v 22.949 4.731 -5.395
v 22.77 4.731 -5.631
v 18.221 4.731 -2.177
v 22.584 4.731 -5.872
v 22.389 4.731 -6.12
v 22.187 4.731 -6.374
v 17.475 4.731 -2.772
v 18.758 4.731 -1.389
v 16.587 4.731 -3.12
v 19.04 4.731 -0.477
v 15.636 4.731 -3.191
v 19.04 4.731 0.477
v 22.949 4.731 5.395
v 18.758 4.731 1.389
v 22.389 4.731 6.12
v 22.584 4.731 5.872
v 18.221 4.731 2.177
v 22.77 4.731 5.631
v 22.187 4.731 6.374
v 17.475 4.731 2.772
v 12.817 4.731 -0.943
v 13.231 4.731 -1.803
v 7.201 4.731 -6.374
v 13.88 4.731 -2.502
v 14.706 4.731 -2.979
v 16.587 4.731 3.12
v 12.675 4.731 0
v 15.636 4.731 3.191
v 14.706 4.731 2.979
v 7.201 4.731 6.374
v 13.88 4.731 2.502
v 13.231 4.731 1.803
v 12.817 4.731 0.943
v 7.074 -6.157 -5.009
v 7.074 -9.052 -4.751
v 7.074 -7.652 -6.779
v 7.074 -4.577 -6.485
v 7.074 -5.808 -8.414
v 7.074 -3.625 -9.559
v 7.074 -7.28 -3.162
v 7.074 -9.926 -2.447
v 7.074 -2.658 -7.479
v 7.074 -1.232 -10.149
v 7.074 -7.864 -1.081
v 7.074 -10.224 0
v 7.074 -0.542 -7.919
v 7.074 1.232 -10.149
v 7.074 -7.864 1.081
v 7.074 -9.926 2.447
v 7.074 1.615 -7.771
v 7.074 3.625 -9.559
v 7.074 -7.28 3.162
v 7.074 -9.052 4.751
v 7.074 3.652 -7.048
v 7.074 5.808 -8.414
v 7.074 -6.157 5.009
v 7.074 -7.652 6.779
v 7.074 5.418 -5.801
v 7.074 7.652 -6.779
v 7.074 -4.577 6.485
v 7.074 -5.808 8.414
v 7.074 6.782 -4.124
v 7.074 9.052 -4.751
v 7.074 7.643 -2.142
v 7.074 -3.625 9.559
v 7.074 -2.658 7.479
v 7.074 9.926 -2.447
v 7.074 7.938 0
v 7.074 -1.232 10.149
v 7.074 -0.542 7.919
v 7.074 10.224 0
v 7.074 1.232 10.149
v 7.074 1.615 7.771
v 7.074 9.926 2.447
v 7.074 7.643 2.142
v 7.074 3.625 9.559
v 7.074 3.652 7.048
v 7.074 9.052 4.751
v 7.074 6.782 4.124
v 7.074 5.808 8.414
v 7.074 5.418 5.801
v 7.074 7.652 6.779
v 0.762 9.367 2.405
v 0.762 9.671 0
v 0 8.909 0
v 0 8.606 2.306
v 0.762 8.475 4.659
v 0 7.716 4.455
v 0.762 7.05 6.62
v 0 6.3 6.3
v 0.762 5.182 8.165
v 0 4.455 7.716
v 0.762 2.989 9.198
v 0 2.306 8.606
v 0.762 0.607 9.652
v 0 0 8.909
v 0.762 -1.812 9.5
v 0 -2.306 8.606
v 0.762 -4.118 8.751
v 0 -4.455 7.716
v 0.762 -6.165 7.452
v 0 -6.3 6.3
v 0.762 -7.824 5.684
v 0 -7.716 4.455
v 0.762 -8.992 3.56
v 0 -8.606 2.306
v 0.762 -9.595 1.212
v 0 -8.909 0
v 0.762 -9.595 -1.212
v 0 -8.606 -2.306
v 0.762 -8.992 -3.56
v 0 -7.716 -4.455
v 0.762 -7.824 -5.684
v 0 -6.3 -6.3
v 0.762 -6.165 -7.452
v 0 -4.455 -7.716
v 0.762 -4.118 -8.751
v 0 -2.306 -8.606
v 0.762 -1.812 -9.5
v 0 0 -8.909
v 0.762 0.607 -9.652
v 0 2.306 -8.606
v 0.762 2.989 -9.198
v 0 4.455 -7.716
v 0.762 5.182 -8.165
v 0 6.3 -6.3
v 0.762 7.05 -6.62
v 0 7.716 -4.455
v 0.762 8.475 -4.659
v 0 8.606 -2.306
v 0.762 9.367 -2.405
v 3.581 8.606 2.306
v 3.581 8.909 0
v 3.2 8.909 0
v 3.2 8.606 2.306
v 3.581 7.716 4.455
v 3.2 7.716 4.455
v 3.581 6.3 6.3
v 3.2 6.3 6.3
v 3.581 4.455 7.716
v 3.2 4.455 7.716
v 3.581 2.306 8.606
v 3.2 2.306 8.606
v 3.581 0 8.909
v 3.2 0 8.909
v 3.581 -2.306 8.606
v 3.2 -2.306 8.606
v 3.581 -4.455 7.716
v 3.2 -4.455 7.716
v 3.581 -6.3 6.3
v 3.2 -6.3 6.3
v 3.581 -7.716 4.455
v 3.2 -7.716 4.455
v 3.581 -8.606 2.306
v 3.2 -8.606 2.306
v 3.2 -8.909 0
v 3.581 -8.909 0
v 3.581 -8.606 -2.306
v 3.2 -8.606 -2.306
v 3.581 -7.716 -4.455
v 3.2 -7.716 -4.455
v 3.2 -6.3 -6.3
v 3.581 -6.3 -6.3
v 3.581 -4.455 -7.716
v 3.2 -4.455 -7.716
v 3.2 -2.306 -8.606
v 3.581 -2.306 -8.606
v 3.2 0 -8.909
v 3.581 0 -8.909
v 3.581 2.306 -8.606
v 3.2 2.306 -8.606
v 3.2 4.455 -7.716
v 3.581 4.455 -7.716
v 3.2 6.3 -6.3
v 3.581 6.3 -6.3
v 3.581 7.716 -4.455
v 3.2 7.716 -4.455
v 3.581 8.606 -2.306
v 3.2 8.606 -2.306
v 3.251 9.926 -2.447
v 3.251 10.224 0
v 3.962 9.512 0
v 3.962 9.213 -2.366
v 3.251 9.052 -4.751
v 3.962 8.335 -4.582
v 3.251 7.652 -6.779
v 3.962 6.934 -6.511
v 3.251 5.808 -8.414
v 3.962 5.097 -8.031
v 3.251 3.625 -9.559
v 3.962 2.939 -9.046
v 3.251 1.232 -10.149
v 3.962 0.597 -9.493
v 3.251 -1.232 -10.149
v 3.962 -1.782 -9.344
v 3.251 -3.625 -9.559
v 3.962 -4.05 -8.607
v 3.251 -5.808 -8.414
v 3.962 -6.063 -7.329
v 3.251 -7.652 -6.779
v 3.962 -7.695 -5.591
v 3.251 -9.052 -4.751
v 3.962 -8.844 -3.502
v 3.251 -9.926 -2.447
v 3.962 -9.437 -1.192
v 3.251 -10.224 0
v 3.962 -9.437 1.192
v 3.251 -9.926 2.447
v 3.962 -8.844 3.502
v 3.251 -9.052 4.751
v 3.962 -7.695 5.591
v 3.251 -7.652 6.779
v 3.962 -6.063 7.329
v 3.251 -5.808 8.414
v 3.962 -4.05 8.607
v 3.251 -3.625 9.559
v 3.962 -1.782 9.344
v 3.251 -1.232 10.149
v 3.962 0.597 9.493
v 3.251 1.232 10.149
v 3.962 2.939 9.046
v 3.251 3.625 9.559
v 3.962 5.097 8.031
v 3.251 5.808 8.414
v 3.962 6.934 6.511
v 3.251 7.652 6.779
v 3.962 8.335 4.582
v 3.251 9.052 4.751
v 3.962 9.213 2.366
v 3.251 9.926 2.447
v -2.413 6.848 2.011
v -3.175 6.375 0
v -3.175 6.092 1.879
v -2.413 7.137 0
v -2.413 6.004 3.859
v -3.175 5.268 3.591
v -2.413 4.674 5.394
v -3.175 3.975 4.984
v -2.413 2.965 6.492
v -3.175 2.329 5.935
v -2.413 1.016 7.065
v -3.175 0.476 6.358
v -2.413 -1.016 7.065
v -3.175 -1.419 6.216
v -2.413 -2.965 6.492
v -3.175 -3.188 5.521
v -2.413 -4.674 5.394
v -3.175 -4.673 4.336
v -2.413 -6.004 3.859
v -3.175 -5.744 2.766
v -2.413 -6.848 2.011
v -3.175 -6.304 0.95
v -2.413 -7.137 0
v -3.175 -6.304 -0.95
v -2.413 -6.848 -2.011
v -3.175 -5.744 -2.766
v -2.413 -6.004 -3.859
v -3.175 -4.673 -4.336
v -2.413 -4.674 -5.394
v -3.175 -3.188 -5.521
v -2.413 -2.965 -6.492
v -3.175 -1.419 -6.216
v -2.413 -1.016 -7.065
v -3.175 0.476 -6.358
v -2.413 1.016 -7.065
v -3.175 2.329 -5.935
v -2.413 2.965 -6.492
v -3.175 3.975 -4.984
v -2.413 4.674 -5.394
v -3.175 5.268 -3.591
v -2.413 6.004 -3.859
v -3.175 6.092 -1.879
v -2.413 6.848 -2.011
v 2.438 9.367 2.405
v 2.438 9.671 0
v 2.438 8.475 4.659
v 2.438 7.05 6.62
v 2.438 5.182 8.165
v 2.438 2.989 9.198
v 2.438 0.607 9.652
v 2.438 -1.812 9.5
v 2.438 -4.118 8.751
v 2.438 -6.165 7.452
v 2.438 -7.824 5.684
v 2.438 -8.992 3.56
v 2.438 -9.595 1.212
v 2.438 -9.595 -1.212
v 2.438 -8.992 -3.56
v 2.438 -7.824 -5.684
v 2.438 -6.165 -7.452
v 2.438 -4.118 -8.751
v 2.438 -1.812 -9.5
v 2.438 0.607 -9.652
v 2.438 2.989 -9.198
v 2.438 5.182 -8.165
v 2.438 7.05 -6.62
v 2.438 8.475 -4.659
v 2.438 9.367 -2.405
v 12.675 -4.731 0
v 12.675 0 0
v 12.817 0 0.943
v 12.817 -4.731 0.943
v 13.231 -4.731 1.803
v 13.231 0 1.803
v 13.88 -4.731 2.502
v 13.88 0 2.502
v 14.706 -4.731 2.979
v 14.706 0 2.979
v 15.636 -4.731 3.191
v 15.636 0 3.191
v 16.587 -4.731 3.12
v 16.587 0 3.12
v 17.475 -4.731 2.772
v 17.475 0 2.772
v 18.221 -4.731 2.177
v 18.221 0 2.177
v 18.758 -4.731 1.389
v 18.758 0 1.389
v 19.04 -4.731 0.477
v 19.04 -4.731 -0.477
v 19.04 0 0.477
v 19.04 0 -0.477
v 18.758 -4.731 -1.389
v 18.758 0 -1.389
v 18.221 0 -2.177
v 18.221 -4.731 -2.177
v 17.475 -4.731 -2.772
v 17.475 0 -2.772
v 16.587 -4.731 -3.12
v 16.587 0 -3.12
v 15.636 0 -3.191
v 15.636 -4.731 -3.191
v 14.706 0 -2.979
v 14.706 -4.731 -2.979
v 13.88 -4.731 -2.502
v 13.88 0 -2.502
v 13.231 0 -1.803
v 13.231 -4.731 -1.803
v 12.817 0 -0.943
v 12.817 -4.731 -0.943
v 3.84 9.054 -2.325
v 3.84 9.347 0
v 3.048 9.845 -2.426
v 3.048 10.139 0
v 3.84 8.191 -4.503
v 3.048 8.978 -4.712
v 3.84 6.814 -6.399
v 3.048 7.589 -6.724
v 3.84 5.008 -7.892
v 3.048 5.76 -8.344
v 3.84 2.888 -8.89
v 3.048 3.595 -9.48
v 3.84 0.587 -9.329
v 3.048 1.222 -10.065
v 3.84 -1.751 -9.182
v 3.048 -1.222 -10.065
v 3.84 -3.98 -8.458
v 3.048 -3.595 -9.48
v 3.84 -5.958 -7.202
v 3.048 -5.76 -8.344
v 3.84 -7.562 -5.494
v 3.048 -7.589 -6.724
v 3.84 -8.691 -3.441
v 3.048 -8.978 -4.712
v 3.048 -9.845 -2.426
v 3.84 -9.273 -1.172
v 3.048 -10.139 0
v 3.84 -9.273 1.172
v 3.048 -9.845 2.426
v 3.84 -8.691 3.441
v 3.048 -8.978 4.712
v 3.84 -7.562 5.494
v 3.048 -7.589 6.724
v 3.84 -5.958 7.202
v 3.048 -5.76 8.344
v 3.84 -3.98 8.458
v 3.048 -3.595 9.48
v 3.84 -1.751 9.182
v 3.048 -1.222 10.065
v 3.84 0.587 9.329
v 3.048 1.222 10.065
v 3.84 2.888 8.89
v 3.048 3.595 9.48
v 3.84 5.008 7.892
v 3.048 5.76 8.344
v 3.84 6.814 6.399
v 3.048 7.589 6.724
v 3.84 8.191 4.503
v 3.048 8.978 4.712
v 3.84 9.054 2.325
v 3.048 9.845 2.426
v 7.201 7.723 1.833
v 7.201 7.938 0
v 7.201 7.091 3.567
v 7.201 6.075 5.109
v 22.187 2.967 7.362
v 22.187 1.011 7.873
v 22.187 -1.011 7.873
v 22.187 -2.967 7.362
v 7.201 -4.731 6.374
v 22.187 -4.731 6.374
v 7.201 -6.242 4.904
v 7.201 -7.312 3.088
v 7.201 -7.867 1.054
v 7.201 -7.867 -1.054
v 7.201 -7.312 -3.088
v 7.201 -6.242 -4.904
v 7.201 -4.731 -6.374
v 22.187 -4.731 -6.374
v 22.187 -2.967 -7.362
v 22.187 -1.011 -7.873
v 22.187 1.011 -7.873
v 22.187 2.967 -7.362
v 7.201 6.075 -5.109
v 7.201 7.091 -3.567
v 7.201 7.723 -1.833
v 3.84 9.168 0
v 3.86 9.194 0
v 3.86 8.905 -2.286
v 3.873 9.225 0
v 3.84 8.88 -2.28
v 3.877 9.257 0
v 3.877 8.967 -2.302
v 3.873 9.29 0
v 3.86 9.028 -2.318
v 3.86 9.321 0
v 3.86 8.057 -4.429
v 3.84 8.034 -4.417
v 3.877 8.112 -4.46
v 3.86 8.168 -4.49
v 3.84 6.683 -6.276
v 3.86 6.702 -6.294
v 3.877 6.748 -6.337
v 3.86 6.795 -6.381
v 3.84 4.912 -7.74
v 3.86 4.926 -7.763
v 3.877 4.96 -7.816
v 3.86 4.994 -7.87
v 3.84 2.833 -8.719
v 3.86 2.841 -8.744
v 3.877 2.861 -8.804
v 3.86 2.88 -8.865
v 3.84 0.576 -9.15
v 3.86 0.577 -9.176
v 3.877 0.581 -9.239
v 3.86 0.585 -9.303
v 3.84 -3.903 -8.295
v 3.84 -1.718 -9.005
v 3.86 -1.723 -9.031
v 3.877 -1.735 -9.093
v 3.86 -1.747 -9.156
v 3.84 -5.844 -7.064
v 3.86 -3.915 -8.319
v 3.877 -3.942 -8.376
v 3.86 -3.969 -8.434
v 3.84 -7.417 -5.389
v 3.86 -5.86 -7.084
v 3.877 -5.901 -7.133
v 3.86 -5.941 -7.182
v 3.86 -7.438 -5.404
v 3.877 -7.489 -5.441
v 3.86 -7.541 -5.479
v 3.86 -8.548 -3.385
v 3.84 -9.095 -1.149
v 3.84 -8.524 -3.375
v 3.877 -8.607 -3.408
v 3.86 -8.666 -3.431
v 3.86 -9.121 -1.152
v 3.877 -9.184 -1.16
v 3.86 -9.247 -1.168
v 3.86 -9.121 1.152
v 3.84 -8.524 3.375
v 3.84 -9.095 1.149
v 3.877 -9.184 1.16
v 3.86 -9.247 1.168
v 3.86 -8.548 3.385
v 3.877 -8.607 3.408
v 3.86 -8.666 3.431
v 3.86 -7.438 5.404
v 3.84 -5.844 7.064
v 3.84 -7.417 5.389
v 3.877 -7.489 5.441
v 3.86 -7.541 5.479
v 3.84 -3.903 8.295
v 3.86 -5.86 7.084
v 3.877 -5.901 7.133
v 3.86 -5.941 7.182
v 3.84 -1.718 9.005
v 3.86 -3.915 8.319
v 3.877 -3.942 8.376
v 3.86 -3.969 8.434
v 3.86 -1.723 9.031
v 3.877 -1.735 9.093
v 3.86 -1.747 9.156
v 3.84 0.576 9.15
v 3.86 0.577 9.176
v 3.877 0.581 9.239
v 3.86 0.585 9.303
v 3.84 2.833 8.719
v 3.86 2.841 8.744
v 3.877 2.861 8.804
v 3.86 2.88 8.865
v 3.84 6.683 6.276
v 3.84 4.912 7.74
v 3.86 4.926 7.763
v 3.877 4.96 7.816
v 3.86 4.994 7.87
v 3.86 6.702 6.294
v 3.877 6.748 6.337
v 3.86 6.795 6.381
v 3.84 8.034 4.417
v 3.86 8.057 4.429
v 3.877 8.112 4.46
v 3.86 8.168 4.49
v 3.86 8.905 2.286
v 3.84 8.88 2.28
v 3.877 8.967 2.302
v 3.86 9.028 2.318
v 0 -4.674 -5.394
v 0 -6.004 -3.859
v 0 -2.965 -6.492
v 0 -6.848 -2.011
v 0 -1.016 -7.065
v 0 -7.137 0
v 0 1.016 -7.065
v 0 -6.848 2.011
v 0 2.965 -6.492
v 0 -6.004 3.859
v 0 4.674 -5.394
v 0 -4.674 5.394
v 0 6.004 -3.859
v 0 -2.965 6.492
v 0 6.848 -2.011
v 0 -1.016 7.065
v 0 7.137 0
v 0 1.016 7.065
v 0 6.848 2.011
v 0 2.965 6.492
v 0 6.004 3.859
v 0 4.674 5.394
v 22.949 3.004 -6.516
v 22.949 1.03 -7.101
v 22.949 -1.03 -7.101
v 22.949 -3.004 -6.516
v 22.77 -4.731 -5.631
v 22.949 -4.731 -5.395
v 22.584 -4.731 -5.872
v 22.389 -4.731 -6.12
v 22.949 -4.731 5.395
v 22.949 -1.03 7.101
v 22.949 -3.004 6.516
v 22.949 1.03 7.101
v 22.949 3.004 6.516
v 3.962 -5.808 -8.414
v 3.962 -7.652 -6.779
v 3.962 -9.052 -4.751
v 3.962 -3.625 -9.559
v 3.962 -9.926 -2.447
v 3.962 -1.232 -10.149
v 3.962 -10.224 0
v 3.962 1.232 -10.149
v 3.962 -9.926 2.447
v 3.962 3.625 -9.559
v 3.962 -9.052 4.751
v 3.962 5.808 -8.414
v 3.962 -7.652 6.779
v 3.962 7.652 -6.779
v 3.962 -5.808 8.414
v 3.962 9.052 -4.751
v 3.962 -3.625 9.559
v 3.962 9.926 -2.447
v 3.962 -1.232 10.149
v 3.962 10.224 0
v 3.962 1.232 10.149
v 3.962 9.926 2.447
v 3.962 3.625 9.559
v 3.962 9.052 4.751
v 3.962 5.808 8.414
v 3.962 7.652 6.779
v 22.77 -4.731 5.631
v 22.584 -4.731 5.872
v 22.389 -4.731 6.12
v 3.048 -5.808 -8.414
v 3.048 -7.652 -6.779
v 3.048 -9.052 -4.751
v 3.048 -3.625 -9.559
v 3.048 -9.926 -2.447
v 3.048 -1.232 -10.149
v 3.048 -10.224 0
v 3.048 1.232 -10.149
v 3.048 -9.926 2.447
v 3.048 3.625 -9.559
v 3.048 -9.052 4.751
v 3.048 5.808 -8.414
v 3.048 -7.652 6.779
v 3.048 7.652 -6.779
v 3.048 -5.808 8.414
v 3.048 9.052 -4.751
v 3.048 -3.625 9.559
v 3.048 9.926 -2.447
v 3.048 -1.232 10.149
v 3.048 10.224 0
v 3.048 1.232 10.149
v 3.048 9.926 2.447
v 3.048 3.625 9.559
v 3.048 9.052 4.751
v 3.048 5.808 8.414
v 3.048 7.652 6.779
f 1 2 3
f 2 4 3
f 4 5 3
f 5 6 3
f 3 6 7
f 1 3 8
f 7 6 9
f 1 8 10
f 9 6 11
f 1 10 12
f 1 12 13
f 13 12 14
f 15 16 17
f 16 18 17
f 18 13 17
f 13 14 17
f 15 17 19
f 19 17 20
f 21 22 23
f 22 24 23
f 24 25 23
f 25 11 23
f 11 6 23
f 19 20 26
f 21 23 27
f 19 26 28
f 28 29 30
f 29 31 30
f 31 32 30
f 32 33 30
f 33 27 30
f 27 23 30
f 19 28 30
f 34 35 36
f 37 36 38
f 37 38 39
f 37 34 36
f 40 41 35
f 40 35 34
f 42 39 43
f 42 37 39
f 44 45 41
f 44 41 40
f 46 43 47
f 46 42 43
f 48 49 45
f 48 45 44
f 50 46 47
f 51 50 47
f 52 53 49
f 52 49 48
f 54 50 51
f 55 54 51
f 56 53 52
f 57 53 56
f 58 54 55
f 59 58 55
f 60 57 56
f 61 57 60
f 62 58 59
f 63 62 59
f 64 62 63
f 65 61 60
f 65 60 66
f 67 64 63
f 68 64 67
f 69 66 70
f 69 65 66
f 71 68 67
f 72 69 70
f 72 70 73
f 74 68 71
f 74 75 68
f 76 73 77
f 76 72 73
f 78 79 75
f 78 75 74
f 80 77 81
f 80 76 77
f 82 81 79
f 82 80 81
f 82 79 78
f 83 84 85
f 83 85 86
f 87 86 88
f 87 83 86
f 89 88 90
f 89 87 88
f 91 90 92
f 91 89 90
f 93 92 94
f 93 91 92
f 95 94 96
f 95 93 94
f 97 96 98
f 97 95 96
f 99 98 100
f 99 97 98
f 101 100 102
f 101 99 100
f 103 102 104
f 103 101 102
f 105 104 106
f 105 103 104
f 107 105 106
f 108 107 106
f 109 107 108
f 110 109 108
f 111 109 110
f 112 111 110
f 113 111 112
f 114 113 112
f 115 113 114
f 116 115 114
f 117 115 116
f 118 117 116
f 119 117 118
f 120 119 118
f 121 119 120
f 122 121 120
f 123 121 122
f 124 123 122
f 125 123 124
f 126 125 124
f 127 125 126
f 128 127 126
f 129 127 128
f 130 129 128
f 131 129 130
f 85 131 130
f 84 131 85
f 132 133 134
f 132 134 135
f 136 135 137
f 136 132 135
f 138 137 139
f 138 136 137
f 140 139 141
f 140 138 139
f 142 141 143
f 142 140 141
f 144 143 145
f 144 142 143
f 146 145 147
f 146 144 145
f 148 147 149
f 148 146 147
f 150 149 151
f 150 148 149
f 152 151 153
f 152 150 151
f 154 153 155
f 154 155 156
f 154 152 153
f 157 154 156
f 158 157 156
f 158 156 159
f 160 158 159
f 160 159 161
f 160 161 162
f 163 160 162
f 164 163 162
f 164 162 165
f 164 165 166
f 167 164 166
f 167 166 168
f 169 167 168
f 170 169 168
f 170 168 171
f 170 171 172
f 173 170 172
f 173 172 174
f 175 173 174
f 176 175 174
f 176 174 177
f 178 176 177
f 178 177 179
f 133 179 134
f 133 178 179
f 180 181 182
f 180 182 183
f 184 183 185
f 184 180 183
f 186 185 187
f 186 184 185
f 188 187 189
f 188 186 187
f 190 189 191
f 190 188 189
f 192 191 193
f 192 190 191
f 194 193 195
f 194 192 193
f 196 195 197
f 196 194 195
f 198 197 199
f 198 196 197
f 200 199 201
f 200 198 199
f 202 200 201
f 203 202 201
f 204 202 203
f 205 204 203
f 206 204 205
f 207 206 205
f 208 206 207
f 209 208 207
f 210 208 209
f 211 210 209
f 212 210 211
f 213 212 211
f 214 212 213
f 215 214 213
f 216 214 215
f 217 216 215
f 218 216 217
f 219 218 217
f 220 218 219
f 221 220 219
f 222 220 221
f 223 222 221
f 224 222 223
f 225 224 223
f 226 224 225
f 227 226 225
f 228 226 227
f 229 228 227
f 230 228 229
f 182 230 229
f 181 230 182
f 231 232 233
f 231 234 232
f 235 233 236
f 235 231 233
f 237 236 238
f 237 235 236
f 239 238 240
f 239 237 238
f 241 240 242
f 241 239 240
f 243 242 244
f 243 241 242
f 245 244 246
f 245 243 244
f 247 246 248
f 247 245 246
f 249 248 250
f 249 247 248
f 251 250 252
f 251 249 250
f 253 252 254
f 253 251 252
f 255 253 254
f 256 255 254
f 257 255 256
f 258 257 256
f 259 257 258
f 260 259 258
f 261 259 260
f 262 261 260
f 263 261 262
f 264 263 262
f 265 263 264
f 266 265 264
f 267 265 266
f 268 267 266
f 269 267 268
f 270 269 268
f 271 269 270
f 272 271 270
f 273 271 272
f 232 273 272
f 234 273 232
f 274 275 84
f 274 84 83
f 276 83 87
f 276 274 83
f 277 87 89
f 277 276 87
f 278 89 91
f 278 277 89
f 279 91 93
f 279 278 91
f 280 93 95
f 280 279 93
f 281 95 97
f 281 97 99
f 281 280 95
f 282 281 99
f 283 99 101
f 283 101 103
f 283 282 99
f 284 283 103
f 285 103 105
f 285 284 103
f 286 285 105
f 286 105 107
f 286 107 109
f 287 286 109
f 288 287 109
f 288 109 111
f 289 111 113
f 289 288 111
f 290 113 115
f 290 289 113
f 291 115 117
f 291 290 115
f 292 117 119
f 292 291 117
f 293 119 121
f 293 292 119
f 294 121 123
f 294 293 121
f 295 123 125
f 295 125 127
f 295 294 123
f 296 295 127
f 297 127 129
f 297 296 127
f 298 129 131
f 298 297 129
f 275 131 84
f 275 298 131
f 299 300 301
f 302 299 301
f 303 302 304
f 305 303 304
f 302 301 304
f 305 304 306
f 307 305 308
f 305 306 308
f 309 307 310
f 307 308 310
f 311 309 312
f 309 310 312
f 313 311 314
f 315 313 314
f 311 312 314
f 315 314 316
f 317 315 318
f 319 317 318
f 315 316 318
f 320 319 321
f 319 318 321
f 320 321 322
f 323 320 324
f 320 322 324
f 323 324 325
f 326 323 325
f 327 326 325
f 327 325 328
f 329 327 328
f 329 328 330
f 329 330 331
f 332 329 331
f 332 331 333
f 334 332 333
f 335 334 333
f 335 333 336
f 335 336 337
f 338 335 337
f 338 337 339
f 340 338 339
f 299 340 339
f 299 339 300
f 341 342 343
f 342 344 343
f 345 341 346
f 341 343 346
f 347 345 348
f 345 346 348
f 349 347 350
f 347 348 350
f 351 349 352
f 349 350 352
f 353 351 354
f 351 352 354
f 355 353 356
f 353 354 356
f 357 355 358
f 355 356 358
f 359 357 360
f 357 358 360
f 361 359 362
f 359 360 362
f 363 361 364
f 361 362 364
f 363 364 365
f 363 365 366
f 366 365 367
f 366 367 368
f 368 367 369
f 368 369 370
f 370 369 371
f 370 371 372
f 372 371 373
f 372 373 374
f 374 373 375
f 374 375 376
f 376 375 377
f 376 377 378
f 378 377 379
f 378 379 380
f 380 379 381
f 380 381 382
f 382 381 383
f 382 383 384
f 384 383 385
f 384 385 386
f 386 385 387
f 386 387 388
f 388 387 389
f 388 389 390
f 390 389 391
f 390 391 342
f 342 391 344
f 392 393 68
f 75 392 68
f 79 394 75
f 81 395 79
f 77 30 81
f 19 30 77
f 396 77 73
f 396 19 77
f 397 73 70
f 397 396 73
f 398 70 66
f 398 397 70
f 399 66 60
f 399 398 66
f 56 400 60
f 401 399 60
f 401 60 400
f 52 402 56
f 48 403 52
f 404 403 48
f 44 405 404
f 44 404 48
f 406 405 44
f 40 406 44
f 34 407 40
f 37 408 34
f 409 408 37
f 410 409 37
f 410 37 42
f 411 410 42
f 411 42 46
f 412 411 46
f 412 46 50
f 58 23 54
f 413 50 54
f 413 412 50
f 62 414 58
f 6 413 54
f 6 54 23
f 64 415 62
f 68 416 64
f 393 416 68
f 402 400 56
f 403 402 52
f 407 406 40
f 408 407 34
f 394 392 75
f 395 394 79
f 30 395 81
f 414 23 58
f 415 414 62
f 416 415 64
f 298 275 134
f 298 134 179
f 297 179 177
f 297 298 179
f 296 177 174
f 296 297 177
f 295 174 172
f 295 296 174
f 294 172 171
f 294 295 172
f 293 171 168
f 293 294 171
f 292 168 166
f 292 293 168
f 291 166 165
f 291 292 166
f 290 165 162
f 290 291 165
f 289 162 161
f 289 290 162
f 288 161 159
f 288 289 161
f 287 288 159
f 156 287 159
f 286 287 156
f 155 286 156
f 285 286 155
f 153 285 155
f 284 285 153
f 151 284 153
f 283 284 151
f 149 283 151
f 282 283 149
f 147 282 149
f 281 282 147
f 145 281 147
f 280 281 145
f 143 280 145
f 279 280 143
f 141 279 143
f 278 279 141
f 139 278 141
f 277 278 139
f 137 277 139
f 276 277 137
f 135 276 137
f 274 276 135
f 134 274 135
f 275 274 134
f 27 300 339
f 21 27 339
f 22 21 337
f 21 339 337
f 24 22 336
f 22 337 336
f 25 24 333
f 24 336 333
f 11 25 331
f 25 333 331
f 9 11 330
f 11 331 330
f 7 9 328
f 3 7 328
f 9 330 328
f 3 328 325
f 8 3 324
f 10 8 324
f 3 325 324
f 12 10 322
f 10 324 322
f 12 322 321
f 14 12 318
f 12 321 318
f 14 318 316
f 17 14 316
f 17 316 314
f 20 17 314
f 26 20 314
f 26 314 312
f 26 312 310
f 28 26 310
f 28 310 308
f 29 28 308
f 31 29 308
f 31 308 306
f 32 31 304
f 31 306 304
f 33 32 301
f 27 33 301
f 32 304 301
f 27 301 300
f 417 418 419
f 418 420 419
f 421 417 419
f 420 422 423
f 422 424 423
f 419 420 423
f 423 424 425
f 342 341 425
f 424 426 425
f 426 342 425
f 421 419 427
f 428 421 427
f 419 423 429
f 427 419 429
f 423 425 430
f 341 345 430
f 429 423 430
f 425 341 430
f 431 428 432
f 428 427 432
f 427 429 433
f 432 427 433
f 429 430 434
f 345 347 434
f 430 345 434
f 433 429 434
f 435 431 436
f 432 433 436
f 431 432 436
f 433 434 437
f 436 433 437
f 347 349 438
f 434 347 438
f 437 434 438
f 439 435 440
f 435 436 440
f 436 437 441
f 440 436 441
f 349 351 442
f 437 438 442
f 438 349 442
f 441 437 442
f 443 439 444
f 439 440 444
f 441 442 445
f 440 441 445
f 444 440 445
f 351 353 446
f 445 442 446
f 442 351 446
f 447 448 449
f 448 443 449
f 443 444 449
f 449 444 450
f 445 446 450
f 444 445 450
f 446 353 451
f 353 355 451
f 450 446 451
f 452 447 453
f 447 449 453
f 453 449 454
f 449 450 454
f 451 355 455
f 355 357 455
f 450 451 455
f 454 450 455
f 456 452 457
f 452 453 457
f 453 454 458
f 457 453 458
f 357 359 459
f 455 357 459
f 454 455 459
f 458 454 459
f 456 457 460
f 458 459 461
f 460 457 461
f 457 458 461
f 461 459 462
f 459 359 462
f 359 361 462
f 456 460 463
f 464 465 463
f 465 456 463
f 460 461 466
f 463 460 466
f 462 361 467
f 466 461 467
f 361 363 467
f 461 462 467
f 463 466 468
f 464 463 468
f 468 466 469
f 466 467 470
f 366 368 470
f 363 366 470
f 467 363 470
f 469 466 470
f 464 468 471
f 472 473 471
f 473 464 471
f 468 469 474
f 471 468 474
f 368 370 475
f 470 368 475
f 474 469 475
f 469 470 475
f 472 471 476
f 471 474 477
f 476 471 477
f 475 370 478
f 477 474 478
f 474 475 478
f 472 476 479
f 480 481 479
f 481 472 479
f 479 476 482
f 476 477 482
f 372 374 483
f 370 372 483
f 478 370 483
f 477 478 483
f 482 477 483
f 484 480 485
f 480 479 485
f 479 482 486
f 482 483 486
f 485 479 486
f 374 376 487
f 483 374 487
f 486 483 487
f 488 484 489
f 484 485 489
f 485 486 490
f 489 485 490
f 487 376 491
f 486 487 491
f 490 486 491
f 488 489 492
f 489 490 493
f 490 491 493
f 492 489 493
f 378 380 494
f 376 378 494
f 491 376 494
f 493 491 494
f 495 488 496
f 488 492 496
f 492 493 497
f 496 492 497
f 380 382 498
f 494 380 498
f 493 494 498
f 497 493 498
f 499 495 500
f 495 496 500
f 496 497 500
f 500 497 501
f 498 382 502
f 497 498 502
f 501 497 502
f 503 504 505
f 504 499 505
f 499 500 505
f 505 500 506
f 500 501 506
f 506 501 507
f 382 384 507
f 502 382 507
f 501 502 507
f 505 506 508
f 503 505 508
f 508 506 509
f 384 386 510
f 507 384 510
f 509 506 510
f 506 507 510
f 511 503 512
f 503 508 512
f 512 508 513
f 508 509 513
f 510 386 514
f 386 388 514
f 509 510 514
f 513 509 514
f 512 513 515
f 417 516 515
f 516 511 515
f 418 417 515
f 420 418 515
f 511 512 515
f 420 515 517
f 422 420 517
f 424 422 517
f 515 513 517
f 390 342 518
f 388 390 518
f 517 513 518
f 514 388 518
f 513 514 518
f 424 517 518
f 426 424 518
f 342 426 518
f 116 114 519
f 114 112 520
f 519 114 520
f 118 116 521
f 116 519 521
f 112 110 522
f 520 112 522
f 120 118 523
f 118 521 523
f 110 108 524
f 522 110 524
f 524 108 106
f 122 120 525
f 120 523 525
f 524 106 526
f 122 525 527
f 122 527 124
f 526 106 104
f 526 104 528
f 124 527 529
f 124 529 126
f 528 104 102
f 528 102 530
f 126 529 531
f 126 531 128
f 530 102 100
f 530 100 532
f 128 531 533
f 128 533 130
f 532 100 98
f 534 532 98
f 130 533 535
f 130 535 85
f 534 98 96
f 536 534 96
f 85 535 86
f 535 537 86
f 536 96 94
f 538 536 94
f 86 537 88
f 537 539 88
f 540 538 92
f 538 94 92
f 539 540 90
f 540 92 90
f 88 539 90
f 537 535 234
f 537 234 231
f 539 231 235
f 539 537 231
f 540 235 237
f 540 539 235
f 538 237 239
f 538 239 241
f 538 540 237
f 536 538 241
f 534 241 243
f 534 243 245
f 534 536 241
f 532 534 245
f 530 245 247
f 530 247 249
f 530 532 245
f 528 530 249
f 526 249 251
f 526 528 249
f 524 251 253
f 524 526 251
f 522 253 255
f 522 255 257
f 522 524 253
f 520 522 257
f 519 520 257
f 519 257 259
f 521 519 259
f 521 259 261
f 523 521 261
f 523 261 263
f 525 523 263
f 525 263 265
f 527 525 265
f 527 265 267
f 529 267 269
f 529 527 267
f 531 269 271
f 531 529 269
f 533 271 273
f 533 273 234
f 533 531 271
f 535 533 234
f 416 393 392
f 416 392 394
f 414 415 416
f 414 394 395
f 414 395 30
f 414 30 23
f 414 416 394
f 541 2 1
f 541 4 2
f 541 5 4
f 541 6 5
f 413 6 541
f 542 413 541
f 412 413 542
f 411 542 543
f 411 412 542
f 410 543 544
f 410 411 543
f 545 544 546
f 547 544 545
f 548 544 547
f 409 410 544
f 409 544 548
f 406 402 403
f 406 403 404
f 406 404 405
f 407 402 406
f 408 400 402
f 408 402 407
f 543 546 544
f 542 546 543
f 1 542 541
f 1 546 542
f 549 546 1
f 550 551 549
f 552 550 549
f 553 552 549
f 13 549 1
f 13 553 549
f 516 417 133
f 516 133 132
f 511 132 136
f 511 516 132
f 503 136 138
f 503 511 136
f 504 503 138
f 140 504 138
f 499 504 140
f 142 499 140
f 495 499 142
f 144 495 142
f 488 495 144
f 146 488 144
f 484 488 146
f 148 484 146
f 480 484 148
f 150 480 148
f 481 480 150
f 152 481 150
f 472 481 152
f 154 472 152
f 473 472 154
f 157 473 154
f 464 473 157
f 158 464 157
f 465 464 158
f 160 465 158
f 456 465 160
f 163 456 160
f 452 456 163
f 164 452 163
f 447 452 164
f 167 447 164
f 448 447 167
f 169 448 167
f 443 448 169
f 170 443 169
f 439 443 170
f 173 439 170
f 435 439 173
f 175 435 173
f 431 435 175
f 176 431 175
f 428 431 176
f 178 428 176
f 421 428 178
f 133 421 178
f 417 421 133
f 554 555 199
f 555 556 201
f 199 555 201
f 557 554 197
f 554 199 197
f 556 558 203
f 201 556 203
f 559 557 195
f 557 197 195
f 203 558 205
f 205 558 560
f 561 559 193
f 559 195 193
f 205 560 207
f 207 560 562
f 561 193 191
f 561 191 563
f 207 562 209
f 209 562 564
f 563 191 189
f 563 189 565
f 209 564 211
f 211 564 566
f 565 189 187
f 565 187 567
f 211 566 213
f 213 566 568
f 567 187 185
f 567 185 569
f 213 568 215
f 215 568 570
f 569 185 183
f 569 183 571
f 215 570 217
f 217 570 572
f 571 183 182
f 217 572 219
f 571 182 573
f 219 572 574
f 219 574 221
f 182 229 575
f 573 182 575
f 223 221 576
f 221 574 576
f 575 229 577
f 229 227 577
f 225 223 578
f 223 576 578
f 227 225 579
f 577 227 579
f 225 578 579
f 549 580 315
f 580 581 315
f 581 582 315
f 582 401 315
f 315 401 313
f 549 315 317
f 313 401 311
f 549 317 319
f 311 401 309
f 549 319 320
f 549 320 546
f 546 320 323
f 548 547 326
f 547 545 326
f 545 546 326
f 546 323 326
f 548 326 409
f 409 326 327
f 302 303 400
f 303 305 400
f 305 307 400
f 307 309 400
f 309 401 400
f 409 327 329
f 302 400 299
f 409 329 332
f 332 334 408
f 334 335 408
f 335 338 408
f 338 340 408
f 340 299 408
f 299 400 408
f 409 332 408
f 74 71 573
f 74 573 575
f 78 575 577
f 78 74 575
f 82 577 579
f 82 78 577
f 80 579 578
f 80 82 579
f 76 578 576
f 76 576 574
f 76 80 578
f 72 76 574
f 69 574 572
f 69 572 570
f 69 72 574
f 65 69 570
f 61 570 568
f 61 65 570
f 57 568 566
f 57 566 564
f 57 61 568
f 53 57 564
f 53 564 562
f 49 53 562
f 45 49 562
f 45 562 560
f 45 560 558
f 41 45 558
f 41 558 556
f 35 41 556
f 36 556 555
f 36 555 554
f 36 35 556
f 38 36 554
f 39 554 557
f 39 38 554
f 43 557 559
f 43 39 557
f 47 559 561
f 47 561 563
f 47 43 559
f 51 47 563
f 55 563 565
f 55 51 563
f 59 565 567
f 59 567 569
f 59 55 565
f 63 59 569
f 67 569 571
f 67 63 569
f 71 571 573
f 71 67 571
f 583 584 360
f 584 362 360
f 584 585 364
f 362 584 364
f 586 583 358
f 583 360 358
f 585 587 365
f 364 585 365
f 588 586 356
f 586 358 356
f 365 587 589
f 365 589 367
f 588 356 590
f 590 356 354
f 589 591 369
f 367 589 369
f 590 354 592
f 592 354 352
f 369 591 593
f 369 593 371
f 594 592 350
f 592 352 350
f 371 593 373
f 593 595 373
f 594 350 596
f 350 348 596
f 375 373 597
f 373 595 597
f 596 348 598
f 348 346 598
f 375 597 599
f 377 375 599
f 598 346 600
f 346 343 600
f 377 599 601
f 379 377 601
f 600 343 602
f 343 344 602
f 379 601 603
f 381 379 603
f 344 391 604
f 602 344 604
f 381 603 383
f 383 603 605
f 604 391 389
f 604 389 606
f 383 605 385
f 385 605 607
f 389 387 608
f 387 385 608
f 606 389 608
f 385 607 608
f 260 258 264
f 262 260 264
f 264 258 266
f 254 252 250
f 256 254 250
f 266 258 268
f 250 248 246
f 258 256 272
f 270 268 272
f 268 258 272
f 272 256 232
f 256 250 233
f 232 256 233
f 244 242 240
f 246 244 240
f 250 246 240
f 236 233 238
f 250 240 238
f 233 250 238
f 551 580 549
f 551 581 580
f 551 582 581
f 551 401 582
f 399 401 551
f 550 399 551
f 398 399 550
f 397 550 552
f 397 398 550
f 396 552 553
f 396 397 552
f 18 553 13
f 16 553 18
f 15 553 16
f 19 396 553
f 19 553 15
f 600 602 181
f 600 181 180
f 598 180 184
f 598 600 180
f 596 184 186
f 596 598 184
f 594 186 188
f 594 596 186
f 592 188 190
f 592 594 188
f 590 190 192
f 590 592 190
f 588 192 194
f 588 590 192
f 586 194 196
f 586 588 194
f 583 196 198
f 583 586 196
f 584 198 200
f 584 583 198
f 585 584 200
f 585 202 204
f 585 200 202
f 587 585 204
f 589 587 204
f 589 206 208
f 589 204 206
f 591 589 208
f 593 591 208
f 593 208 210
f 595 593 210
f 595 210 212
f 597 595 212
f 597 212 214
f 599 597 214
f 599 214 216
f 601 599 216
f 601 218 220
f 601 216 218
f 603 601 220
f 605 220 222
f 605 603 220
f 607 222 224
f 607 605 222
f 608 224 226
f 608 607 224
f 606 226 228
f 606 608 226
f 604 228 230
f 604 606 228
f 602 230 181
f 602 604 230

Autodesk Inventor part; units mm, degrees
sketch "Sketch_1" plane through (0, 0, 0) normal (0, 0, 1) x (1, 0, 0)
  line L0 (7.0739, 0) -> (0, 0)
  line L1 (0, 0) -> (0, 8.9091)
  line L2 (0, 8.9091) -> (0.762, 9.671)
  line L3 (0.762, 9.671) -> (2.4384, 9.671)
  line L4 (2.4384, 9.671) -> (3.2004, 8.9091)
  line L5 (3.2004, 8.9091) -> (3.9624, 8.9091)
  line L6 (3.9624, 8.9091) -> (3.9624, 10.2235)
  line L7 (3.9624, 10.2235) -> (7.0739, 10.2235)
  line L8 (7.0739, 10.2235) -> (7.0739, 0)
  line L9 (7.0739, 0) -> (0, 0)
revolve "Revolution1" add sketch "Sketch_1" angle 360 about axis through (7.0739, 0, 0) along (1, 0, 0)
sketch "Sketch_24" plane through (0, 0, 0) normal (0, 0, 1) x (1, 0, 0)
  line L0 (3.9624, 0) -> (3.2004, 0)
  line L1 (3.0477, 10.2235) -> (3.0477, 10.1393)
  line L2 (3.0477, 10.1393) -> (3.8399, 9.3472)
  arc A0 (3.8399, 9.1676) -> (3.8399, 9.3472) centre (3.7501, 9.2574) ccw
  line L3 (3.8399, 9.1676) -> (3.5814, 8.9091)
  line L4 (3.5814, 8.9091) -> (3.2004, 8.9091)
  line L5 (3.2004, 8.9091) -> (3.2004, 8.655)
  line L6 (3.2004, 8.655) -> (3.9624, 8.655)
  line L7 (3.9624, 8.655) -> (3.9624, 9.512)
  line L8 (3.9624, 9.512) -> (3.2509, 10.2235)
  line L9 (3.2509, 10.2235) -> (3.0477, 10.2235)
revolve "Revolution2" add sketch "Sketch_24" angle 360 about axis through (3.9624, 0, 0) along (1, 0, 0)
sketch "Sketch_26" plane through (0, 0, 0) normal (0, 0, 1) x (1, 0, 0)
  line L0 (0, 0) -> (-3.175, 0)
  line L1 (-3.175, 0) -> (-3.175, 6.3754)
  line L2 (-3.175, 6.3754) -> (-2.413, 7.1374)
  line L3 (-2.413, 7.1374) -> (0, 7.1374)
  line L4 (0, 7.1374) -> (0, 0)
  line L5 (0, 0) -> (-3.175, 0)
revolve "Revolution3" add sketch "Sketch_26" angle 360 about axis through (0, 0, 0) along (1, 0, 0)
sketch "Sketch_27" plane through (0, 0, 0) normal (0, 0, 1) x (1, 0, 0)
  line L0 (22.9489, 0) -> (7.0739, 0)
  line L1 (7.0739, 0) -> (7.0739, 7.9375)
  line L2 (7.0739, 7.9375) -> (22.1869, 7.9375)
  line L3 (22.1869, 7.9375) -> (22.9489, 7.1755)
  line L4 (22.9489, 7.1755) -> (22.9489, 0)
  line L5 (22.9489, 0) -> (7.0739, 0)
revolve "Revolution4" add sketch "Sketch_27" angle 360 about axis through (22.9489, 0, 0) along (1, 0, 0)
sketch "Sketch_28" plane through (7.2009, 0, 0) normal (1, 0, 0) x (0, 0, -1)
  line L0 (-15.875, 15.875) -> (-15.875, -15.875)
  line L1 (-15.875, -15.875) -> (15.875, -15.875)
  line L2 (15.875, -15.875) -> (15.875, 15.875)
  line L3 (15.875, 15.875) -> (-15.875, 15.875)
  line L4 (-12.7, 4.7308) -> (-12.7, -4.7308)
  line L5 (-12.7, -4.7308) -> (12.7, -4.7308)
  line L6 (12.7, -4.7308) -> (12.7, 4.7308)
  line L7 (12.7, 4.7308) -> (-12.7, 4.7308)
extrude "Extrusion1" cut sketch "Sketch_28" along normal blind 15.875
sketch "Sketch_29" plane through (0, 0, 0) normal (0, 1, 0) x (-1, 0, 0)
  circle A0 centre (-15.875, 0) radius 3.2004
extrude "Extrusion2" cut sketch "Sketch_29" along normal mid plane 18.923
ref_plane "1_XY" through (7.0739, 0, 0) normal (1, 0, 0) x (0, 0, -1)
ref_plane "1_YZ" through (7.0739, 0, 0) normal (0, 0, -1) x (0, 1, 0)
ref_plane "1_ZX" through (7.0739, 0, 0) normal (0, 1, 0) x (1, 0, 0)
ref_plane "lovra_XY" through (7.0739, 0, 0) normal (1, 0, 0) x (0, 1, 0)
ref_plane "lovra_YZ" through (7.0739, 0, 0) normal (0, 1, 0) x (0, 0, 1)
ref_plane "lovra_ZX" through (7.0739, 0, 0) normal (0, 0, 1) x (1, 0, 0)
ref_plane "lovra1_XY" through (2.2987, 0, 0) normal (1, 0, 0) x (0, 0, -1)
ref_plane "lovra1_YZ" through (2.2987, 0, 0) normal (0, 0, -1) x (0, 1, 0)
ref_plane "lovra1_ZX" through (2.2987, 0, 0) normal (0, 1, 0) x (1, 0, 0)
ref_plane "lovra2_XY" through (2.2987, 7.874, 0) normal (1, 0, 0) x (0, 0, -1)
ref_plane "lovra2_YZ" through (2.2987, 7.874, 0) normal (0, 0, -1) x (0, 1, 0)
ref_plane "lovra2_ZX" through (2.2987, 7.874, 0) normal (0, 1, 0) x (1, 0, 0)
ref_plane "lovra21_XY" through (0, 0, 5.2705) normal (1, 0, 0) x (0, 0, -1)
ref_plane "lovra21_YZ" through (0, 0, 5.2705) normal (0, 0, -1) x (0, 1, 0)
ref_plane "lovra21_ZX" through (0, 0, 5.2705) normal (0, 1, 0) x (1, 0, 0)
ref_plane "lovra22_XY" through (0, 0, -5.2705) normal (1, 0, 0) x (0, 0, -1)
ref_plane "lovra22_YZ" through (0, 0, -5.2705) normal (0, 0, -1) x (0, 1, 0)
ref_plane "lovra22_ZX" through (0, 0, -5.2705) normal (0, 1, 0) x (1, 0, 0)
ref_plane "lovra3_XY" through (2.2987, -7.874, 0) normal (1, 0, 0) x (0, 0, -1)
ref_plane "lovra3_YZ" through (2.2987, -7.874, 0) normal (0, 0, -1) x (0, 1, 0)
ref_plane "lovra3_ZX" through (2.2987, -7.874, 0) normal (0, 1, 0) x (1, 0, 0)
ref_plane "olen_XY" through (15.875, 0, 0) normal (1, 0, 0) x (0, 0, -1)
ref_plane "olen_YZ" through (15.875, 0, 0) normal (0, 0, -1) x (0, 1, 0)
ref_plane "olen_ZX" through (15.875, 0, 0) normal (0, 1, 0) x (1, 0, 0)
ref_plane "p1_XY" through (22.9489, 0, 4.7308) normal (1, 0, 0) x (0, 0, -1)
ref_plane "p1_YZ" through (22.9489, 0, 4.7308) normal (0, 0, -1) x (0, 1, 0)
ref_plane "p1_ZX" through (22.9489, 0, 4.7308) normal (0, 1, 0) x (1, 0, 0)
ref_plane "p2_XY" through (22.9489, 0, -4.7308) normal (1, 0, 0) x (0, 0, -1)
ref_plane "p2_YZ" through (22.9489, 0, -4.7308) normal (0, 0, -1) x (0, 1, 0)
ref_plane "p2_ZX" through (22.9489, 0, -4.7308) normal (0, 1, 0) x (1, 0, 0)
ref_plane "port2_XY" through (22.9489, 0, 0) normal (1, 0, 0) x (0, 0, -1)
ref_plane "port2_YZ" through (22.9489, 0, 0) normal (0, 0, -1) x (0, 1, 0)
ref_plane "port2_ZX" through (22.9489, 0, 0) normal (0, 1, 0) x (1, 0, 0)
ref_plane "thd1_XY" through (22.9489, 0, 7.9375) normal (1, 0, 0) x (0, 0, -1)
ref_plane "thd1_YZ" through (22.9489, 0, 7.9375) normal (0, 0, -1) x (0, 1, 0)
ref_plane "thd1_ZX" through (22.9489, 0, 7.9375) normal (0, 1, 0) x (1, 0, 0)
ref_plane "thd2_XY" through (22.9489, 0, -7.9375) normal (1, 0, 0) x (0, 0, -1)
ref_plane "thd2_YZ" through (22.9489, 0, -7.9375) normal (0, 0, -1) x (0, 1, 0)
ref_plane "thd2_ZX" through (22.9489, 0, -7.9375) normal (0, 1, 0) x (1, 0, 0)
ref_plane "to_mounting_bracket_XY" through (23.0124, 0, 0) normal (1, 0, 0) x (0, 0, -1)
ref_plane "to_mounting_bracket_YZ" through (23.0124, 0, 0) normal (0, 0, -1) x (0, 1, 0)
ref_plane "to_mounting_bracket_ZX" through (23.0124, 0, 0) normal (0, 1, 0) x (1, 0, 0)
ref_plane "to_nut_XY" through (25.4, 0, 0) normal (1, 0, 0) x (0, 0, -1)
ref_plane "to_nut_YZ" through (25.4, 0, 0) normal (0, 0, -1) x (0, 1, 0)
ref_plane "to_nut_ZX" through (25.4, 0, 0) normal (0, 1, 0) x (1, 0, 0)
ref_plane "to_pin_XY" through (15.875, 0, 0) normal (0, 1, 0) x (1, 0, 0)
ref_plane "to_pin_YZ" through (15.875, 0, 0) normal (1, 0, 0) x (0, 0, -1)
ref_plane "to_pin_ZX" through (15.875, 0, 0) normal (0, 0, -1) x (0, 1, 0)
ref_plane "to_pin_1_XY" through (15.875, 0, 0) normal (0, 0, 1) x (1, 0, 0)
ref_plane "to_pin_1_YZ" through (15.875, 0, 0) normal (1, 0, 0) x (0, 1, 0)
ref_plane "to_pin_1_ZX" through (15.875, 0, 0) normal (0, 1, 0) x (0, 0, 1)
ref_plane "to_pin_r_XY" through (15.875, 0, 0) normal (0, 0, 1) x (1, 0, 0)
ref_plane "to_pin_r_YZ" through (15.875, 0, 0) normal (1, 0, 0) x (0, 1, 0)
ref_plane "to_pin_r_ZX" through (15.875, 0, 0) normal (0, 1, 0) x (0, 0, 1)
ref_plane "to_screw_XY" through (17.4752, -6.0452, -2.032) normal (0, 0, -1) x (1, 0, 0)
ref_plane "to_screw_YZ" through (17.4752, -6.0452, -2.032) normal (1, 0, 0) x (0, -1, 0)
ref_plane "to_screw_ZX" through (17.4752, -6.0452, -2.032) normal (0, -1, 0) x (0, 0, -1)
ref_plane "to_tube_XY" through (3.2004, 0, 0) normal (1, 0, 0) x (0, 0, -1)
ref_plane "to_tube_YZ" through (3.2004, 0, 0) normal (0, 0, -1) x (0, 1, 0)
ref_plane "to_tube_ZX" through (3.2004, 0, 0) normal (0, 1, 0) x (1, 0, 0)
properties part number "04PR0K000_rear_head"
